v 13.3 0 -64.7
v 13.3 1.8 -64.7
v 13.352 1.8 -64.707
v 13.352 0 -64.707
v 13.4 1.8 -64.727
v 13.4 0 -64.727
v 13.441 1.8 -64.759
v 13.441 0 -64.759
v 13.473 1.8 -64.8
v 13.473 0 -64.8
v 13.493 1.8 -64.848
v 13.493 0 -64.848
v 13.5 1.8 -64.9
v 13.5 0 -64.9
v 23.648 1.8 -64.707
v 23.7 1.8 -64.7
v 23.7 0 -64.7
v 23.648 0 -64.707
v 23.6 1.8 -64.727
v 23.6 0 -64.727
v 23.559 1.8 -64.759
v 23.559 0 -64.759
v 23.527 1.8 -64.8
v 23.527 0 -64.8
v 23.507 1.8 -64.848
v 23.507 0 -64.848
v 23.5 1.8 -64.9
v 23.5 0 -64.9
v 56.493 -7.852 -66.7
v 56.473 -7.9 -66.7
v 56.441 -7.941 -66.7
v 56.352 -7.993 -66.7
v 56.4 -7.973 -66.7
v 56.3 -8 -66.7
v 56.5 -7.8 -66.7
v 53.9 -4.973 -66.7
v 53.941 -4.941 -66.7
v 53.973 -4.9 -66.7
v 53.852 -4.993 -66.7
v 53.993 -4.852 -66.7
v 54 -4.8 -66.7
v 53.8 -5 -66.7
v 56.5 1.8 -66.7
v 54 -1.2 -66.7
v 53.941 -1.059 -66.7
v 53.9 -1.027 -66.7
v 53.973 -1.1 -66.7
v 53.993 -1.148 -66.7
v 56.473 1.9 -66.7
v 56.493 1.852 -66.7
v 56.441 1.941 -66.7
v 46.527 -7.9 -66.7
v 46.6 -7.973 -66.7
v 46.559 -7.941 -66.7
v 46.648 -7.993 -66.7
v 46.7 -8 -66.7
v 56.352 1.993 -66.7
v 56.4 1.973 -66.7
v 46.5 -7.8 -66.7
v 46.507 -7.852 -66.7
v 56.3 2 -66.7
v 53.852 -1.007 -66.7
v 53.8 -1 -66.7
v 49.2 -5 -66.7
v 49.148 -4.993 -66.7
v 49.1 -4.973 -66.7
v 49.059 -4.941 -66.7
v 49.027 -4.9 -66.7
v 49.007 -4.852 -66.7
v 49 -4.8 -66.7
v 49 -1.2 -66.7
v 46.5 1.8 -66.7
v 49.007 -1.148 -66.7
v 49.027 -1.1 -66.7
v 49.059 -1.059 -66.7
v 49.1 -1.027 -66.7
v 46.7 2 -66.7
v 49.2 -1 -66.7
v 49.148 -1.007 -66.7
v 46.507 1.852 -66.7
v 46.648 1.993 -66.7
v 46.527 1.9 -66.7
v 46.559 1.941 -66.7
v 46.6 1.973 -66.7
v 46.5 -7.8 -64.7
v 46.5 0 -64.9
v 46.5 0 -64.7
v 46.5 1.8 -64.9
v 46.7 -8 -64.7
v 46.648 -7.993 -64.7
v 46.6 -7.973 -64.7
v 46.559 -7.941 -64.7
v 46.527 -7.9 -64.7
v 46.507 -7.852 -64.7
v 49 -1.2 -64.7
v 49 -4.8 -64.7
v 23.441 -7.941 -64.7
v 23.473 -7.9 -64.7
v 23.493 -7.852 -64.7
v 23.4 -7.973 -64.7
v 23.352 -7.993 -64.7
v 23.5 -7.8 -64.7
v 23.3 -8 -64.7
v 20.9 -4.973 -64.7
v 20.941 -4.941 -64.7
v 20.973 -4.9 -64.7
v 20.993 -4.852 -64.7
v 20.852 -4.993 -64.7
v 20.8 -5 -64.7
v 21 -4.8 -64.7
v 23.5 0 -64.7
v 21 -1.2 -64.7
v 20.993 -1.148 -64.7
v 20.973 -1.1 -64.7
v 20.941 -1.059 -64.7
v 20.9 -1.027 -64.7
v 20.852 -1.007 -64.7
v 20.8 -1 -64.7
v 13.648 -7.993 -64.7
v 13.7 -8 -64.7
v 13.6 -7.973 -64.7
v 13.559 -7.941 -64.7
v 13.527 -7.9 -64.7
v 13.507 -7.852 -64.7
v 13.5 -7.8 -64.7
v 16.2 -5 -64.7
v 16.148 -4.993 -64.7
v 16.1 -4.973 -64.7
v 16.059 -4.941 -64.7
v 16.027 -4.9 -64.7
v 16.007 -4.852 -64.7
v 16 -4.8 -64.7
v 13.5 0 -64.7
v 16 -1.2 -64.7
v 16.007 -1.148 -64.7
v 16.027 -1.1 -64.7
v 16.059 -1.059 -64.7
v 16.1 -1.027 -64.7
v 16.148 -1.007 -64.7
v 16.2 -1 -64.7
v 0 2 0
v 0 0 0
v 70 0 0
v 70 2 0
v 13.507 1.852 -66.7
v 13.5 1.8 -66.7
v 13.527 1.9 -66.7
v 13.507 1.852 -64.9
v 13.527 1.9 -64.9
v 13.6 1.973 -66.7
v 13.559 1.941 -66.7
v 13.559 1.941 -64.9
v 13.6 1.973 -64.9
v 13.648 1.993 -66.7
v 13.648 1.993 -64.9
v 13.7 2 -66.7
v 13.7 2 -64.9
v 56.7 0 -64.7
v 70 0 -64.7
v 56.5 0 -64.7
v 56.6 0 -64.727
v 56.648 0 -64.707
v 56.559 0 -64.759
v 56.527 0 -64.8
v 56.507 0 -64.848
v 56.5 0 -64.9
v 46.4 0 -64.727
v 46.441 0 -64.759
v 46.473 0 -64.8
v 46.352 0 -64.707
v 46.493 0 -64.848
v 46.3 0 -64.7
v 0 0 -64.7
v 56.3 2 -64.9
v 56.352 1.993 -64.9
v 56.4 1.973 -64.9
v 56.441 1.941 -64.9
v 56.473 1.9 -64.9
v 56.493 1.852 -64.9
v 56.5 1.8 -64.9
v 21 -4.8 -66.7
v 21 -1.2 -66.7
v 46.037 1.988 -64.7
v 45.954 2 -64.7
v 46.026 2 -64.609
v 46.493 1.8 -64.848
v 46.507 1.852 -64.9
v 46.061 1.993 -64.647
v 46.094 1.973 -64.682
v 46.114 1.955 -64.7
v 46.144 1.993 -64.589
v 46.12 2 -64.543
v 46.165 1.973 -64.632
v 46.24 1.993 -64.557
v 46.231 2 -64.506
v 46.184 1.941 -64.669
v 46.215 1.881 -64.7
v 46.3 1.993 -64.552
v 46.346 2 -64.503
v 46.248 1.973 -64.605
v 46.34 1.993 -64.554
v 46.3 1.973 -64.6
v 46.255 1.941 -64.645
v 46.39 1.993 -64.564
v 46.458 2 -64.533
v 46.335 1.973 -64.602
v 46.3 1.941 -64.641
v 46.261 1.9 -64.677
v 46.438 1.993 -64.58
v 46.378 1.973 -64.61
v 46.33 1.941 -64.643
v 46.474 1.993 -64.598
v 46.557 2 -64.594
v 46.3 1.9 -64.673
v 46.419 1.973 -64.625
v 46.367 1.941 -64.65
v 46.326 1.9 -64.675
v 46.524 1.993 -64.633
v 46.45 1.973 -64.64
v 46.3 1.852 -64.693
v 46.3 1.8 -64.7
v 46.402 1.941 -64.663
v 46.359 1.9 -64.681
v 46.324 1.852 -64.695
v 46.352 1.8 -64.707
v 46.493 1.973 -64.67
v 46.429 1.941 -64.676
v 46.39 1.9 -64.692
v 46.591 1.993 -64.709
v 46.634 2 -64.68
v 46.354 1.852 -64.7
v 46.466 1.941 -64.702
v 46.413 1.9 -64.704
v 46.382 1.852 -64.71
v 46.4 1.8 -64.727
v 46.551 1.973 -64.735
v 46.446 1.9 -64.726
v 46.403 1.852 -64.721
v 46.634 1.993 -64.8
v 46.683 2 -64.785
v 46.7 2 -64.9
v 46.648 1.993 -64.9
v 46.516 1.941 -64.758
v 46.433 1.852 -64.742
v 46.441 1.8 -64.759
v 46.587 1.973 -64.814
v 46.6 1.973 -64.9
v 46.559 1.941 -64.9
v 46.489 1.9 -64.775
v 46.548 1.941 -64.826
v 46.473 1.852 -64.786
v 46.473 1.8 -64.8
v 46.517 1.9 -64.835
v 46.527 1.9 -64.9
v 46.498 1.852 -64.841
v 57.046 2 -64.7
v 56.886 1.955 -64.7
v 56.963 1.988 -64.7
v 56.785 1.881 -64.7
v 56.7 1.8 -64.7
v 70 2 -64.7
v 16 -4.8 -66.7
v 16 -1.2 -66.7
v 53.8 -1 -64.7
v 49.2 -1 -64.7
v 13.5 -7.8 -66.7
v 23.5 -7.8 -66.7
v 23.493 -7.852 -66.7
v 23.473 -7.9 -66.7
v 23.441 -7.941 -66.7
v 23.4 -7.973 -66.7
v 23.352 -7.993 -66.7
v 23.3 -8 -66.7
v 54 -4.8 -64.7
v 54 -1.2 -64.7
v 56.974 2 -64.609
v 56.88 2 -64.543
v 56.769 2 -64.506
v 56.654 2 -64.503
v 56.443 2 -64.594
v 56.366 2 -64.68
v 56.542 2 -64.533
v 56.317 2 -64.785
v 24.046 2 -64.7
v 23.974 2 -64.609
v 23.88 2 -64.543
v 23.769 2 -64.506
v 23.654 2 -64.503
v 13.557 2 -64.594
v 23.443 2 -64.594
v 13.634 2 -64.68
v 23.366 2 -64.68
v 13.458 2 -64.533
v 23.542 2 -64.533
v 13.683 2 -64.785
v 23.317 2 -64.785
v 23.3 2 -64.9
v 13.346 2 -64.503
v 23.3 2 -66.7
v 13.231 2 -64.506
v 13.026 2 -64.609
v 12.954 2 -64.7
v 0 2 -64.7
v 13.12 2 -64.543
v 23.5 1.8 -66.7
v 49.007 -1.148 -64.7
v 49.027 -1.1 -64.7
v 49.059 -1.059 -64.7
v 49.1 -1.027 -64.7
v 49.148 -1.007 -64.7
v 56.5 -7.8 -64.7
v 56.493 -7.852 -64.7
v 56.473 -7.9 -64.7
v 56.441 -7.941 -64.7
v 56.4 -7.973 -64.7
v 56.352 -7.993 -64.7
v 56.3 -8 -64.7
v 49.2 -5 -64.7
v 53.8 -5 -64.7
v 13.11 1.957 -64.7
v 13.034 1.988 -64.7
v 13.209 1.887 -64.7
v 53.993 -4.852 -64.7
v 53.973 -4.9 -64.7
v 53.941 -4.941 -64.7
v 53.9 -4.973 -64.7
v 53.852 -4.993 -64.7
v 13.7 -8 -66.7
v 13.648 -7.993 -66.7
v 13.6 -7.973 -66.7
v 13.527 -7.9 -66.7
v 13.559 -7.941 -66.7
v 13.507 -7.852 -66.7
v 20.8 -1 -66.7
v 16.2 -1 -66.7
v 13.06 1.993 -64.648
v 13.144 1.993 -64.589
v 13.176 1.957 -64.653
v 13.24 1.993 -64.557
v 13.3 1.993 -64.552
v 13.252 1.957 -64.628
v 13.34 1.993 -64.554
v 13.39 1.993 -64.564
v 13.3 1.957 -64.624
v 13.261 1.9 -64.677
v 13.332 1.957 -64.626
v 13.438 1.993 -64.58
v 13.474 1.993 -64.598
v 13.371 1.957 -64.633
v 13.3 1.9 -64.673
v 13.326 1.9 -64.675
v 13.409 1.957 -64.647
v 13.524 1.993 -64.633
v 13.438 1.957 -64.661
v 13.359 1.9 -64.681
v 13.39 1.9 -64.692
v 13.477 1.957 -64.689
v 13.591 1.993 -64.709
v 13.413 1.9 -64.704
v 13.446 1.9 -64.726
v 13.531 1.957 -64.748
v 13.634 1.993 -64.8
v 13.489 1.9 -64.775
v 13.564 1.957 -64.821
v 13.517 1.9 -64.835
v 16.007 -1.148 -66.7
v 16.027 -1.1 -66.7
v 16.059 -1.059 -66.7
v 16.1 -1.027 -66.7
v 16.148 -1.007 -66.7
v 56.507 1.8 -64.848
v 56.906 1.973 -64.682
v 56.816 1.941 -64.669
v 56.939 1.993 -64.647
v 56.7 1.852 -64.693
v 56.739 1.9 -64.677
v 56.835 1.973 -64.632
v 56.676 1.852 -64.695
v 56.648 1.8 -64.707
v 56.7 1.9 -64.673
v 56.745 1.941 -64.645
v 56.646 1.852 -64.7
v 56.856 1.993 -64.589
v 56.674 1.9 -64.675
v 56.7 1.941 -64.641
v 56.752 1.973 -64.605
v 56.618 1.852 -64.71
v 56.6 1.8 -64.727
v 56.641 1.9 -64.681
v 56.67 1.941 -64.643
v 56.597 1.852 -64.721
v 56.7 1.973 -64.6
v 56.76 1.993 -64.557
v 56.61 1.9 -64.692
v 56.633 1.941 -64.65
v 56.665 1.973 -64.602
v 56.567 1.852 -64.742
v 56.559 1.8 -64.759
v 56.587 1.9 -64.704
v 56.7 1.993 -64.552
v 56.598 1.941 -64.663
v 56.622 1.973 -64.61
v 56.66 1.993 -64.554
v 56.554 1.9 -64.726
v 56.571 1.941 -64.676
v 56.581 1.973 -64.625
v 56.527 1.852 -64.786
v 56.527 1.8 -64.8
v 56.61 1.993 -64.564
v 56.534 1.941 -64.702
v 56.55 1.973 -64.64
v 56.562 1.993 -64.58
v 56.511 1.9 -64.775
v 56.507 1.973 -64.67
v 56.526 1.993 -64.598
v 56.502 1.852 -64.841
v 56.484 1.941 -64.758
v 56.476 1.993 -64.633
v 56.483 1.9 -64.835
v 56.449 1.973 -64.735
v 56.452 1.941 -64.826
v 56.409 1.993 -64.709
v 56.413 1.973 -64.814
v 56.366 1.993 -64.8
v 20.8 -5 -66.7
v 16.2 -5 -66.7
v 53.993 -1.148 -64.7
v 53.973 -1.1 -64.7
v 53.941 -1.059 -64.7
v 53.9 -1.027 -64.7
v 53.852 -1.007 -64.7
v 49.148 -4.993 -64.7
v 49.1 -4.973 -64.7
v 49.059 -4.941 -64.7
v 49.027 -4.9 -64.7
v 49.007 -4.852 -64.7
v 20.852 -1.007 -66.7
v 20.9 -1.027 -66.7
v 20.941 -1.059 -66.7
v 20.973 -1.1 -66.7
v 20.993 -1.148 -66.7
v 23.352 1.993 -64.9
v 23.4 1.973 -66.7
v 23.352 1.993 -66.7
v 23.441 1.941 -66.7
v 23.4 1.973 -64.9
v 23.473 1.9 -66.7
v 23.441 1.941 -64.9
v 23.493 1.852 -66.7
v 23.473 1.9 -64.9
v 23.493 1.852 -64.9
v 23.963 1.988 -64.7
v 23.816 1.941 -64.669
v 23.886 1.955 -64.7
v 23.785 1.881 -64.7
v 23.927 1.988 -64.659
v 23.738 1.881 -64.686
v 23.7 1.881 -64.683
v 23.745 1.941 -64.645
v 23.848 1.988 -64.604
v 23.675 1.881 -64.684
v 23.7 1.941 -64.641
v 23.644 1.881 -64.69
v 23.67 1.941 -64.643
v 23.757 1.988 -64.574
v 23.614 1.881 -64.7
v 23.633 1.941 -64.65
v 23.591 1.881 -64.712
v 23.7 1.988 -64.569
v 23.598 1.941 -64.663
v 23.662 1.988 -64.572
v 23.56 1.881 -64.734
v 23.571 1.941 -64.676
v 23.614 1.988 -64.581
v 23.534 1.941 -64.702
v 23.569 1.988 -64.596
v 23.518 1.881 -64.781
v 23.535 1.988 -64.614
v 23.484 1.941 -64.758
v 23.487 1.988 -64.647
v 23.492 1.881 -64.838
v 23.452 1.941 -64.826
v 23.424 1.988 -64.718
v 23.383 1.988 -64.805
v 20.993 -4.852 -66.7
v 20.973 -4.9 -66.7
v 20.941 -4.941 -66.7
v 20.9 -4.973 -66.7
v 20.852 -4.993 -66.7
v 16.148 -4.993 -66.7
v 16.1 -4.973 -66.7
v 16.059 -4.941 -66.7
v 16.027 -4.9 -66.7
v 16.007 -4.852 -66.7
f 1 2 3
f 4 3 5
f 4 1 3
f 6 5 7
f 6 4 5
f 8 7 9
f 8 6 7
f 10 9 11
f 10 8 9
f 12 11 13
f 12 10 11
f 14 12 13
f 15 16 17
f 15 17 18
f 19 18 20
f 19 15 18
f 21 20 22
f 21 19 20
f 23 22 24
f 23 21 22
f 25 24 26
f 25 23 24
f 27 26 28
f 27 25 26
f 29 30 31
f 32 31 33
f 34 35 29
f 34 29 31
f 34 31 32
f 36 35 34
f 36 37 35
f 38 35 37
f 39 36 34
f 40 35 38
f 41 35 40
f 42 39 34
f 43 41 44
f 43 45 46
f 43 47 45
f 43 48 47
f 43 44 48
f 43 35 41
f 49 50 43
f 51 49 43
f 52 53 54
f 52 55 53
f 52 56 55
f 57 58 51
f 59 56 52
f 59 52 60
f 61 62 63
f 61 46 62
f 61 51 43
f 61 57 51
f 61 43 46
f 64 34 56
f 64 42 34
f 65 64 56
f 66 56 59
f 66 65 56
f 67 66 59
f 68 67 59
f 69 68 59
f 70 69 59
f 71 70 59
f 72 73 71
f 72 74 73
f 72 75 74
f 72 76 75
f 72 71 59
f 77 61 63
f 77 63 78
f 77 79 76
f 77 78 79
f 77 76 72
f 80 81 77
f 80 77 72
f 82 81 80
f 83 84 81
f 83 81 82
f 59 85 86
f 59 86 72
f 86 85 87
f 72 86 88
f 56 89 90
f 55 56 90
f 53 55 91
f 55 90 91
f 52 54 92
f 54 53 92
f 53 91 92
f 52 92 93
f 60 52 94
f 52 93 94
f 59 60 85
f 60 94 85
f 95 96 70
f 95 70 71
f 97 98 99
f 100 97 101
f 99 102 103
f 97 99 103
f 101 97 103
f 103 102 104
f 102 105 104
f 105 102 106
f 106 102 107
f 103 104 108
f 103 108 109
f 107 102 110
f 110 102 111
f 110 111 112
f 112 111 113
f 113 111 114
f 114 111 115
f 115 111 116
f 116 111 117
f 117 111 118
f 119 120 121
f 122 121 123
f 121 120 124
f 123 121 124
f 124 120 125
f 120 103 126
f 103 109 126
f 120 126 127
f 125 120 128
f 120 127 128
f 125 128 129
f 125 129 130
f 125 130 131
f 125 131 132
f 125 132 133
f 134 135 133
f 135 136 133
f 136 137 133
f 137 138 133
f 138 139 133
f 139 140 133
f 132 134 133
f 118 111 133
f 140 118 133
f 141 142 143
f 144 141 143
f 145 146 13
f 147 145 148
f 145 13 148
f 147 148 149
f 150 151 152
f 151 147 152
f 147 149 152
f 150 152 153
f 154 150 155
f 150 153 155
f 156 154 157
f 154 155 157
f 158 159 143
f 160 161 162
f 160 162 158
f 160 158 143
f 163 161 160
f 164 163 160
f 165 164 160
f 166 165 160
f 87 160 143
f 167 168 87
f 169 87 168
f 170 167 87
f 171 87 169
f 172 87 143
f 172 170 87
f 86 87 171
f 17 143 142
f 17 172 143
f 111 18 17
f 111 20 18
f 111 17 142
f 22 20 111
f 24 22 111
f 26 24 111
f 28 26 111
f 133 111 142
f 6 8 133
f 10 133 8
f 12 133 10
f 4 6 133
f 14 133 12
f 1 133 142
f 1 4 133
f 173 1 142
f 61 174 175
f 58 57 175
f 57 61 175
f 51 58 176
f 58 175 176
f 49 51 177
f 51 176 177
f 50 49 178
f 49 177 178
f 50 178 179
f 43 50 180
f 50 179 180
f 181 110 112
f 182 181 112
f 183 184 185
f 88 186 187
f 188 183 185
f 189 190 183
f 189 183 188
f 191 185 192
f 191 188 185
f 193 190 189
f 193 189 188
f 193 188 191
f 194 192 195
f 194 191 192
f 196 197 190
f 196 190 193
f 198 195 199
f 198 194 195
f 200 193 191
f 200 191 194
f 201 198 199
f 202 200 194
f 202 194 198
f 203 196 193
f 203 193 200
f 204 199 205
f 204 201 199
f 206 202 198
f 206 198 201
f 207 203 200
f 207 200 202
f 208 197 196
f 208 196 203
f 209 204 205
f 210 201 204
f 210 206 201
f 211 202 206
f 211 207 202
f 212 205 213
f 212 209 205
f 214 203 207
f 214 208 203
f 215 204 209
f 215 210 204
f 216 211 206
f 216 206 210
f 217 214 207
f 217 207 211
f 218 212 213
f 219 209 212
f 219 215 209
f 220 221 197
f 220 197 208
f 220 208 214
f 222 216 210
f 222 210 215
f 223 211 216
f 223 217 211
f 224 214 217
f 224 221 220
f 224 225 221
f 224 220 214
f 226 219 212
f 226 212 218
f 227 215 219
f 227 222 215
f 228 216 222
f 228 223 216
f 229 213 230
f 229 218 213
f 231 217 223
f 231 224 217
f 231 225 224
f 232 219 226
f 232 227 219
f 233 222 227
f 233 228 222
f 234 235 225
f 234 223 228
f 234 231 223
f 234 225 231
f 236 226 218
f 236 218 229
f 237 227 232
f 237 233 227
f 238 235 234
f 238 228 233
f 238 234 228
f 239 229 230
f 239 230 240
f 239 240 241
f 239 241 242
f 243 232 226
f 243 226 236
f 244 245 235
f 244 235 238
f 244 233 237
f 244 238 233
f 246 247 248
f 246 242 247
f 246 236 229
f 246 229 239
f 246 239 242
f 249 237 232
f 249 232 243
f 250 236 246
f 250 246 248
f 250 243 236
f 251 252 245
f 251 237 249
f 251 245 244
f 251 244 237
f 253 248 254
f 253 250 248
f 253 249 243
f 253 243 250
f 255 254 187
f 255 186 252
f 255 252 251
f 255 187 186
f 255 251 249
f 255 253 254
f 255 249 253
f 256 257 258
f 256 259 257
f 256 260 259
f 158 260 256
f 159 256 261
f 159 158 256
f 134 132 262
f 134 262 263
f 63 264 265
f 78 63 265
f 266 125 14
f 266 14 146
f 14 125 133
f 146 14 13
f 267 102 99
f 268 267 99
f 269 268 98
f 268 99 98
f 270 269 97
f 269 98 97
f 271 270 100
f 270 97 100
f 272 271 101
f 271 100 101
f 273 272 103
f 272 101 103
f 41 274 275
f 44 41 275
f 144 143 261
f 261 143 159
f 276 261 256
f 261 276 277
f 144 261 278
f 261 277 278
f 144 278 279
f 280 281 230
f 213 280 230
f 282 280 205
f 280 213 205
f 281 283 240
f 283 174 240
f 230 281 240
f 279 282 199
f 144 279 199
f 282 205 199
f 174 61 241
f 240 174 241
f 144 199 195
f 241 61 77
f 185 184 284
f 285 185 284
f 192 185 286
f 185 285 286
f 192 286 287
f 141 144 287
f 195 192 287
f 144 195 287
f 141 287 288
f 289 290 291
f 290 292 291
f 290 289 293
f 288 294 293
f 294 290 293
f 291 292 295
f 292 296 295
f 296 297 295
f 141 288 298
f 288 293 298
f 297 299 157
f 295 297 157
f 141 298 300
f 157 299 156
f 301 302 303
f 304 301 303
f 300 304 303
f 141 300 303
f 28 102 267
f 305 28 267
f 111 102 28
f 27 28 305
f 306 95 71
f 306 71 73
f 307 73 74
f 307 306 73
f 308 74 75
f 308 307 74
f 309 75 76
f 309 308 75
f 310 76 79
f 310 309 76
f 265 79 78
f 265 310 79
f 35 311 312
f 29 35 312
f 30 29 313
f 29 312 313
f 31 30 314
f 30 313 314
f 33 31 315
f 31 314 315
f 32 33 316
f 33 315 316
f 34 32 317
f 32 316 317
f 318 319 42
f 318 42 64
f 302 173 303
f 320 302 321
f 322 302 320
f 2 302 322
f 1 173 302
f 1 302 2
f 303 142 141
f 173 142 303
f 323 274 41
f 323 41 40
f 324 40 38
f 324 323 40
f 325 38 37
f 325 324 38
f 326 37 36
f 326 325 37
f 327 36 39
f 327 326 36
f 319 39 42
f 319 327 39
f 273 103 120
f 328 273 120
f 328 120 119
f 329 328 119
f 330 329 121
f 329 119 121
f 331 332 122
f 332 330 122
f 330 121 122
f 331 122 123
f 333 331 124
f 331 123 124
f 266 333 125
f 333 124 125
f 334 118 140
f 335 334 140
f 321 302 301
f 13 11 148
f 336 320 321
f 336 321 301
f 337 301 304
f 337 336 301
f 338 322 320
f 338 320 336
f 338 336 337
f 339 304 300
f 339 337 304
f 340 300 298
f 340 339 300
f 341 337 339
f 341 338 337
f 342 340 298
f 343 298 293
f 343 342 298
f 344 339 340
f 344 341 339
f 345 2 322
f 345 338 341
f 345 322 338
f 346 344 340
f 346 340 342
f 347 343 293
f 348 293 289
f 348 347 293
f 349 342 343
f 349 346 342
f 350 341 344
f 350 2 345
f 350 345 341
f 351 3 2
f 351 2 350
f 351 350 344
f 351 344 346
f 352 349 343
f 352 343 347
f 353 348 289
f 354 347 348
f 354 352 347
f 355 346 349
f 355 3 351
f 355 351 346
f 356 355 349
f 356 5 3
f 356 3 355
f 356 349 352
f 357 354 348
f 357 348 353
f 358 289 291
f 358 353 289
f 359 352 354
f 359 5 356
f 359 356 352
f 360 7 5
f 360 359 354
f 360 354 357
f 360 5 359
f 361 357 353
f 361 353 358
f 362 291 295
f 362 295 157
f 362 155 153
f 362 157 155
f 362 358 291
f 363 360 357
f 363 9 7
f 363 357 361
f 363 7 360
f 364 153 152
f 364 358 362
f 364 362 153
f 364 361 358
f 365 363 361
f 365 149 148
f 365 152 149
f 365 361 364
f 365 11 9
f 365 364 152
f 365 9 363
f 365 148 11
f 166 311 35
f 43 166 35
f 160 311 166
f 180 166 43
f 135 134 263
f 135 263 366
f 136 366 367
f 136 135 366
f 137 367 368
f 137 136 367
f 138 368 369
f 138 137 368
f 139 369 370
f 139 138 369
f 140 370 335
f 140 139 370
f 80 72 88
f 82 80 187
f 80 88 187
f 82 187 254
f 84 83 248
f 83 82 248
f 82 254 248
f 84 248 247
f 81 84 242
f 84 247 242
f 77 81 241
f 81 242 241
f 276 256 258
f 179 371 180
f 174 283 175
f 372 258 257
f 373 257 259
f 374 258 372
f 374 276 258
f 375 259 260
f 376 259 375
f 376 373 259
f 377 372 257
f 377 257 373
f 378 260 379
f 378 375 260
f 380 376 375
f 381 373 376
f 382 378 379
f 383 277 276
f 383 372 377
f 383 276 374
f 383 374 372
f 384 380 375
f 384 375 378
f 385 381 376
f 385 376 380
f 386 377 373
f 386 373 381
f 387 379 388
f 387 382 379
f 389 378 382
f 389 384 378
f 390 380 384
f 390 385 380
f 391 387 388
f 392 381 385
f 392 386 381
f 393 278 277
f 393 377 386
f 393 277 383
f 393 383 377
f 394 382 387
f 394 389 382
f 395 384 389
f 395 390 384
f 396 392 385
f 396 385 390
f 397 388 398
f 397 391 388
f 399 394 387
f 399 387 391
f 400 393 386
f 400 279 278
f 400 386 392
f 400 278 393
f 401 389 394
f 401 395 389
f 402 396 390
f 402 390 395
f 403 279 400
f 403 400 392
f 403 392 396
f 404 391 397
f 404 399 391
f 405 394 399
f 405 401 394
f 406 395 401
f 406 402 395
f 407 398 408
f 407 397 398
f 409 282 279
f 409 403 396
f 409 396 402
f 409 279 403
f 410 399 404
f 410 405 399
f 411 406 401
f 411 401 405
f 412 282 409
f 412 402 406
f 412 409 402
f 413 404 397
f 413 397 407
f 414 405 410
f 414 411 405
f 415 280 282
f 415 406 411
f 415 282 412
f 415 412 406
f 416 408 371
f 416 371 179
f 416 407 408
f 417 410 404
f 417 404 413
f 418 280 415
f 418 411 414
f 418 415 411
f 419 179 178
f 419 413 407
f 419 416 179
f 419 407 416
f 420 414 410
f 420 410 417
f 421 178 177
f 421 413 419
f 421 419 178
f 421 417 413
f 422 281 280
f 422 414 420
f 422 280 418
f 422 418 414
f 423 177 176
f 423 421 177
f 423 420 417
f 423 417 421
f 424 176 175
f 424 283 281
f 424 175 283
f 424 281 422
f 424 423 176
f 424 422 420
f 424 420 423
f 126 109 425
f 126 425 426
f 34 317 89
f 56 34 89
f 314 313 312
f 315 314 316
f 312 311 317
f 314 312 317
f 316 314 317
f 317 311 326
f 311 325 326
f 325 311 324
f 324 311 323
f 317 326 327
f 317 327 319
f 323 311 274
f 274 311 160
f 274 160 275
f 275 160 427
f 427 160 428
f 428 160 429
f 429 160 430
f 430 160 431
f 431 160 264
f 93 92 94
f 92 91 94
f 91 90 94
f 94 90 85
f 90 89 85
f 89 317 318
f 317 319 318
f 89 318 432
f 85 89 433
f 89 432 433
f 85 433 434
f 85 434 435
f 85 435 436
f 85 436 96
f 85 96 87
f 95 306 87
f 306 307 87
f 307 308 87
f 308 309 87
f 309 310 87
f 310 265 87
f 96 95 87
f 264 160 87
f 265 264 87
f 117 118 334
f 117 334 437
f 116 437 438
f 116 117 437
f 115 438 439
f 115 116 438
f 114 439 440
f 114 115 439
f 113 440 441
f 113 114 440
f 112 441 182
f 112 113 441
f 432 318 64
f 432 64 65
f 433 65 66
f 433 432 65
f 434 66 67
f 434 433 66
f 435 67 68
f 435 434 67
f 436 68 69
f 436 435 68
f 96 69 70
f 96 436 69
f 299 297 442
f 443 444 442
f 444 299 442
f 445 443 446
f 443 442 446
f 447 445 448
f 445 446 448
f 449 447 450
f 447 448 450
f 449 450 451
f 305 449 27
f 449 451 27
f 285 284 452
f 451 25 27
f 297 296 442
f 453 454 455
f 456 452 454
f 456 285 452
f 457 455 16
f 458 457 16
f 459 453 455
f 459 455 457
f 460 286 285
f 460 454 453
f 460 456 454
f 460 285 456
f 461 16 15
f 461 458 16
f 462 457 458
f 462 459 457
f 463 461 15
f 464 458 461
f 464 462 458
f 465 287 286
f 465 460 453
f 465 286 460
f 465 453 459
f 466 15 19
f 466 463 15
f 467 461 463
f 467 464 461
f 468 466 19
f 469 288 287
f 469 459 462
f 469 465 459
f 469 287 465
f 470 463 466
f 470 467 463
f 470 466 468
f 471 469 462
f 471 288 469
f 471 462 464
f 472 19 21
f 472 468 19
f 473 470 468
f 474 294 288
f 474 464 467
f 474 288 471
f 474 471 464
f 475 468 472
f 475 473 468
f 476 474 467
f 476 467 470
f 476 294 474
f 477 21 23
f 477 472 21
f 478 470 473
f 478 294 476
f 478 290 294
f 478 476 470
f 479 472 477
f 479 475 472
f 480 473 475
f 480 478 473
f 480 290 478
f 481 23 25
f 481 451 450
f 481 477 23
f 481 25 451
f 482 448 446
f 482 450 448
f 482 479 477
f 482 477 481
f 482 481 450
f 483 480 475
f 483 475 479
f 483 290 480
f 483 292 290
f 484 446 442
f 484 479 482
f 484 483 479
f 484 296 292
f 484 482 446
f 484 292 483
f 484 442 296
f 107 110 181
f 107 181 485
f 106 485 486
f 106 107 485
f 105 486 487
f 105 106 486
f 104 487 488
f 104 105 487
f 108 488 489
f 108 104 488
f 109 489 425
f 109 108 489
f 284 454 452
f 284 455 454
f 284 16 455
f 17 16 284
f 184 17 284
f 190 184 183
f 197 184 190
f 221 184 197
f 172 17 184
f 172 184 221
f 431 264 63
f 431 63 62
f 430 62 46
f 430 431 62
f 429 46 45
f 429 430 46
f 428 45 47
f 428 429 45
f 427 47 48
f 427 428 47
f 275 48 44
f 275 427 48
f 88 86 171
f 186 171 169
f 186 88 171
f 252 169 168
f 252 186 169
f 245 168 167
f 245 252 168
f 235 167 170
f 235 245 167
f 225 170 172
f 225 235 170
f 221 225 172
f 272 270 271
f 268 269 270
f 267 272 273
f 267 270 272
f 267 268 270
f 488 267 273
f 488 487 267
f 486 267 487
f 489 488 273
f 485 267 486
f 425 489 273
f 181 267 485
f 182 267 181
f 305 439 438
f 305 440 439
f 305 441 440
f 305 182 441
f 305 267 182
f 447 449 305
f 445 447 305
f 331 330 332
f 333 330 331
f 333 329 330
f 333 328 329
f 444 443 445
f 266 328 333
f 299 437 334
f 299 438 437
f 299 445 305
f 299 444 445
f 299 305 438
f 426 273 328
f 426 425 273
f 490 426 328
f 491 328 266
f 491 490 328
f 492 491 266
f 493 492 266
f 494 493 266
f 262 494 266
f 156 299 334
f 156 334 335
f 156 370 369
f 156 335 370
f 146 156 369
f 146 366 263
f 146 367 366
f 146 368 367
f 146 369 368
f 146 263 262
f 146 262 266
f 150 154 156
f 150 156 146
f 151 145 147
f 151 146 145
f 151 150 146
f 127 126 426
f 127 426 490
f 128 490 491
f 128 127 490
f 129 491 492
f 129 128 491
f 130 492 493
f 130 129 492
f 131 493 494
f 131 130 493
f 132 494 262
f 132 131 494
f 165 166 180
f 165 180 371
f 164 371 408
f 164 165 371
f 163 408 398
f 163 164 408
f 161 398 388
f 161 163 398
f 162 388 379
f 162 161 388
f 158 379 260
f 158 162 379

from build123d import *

# Parameters (mm, degrees)
SKETCH1_W           = 70
SKETCH1_H           = 64.7
BOSS_EXTRUDE1_DEPTH = 2
SKETCH2_W           = 10
SKETCH2_H           = 10
SKETCH2_W_2         = 5
SKETCH2_H_2         = 4
BOSS_EXTRUDE2_DEPTH = 2
FILLET2_R           = 0.2


with BuildPart() as part:
    # Sketch1 → Boss-Extrude1 (new body)
    with BuildSketch(Plane(origin=(0, 0, 0), x_dir=(1, 0, 0), z_dir=(0, 1, 0))):
        with Locations((35, 32.35)):
            Rectangle(SKETCH1_W, SKETCH1_H)
    extrude(amount=BOSS_EXTRUDE1_DEPTH)

    # Sketch2 → Boss-Extrude2 (add)
    # profile 1 of 2: a face of its own
    with BuildSketch(Plane(origin=(0, 0, -64.7), x_dir=(-1, 0, 0), z_dir=(0, 0, -1))):
        with Locations((-51.5, -3)):
            Rectangle(SKETCH2_W, SKETCH2_H)
        with Locations((-51.5, -3)):
            Rectangle(SKETCH2_W_2, SKETCH2_H_2, mode=Mode.SUBTRACT)
    # profile 2 of 2: a face of its own
    with BuildSketch(Plane(origin=(0, 0, -64.7), x_dir=(-1, 0, 0), z_dir=(0, 0, -1))):
        with Locations((-18.5, -3)):
            Rectangle(SKETCH2_W, SKETCH2_H)
        with Locations((-18.5, -3)):
            Rectangle(SKETCH2_W_2, SKETCH2_H_2, mode=Mode.SUBTRACT)
    extrude(amount=BOSS_EXTRUDE2_DEPTH)

    # Fillet2
    # the kernel refuses this fillet: 0.2 mm, written as the material it adds along each edge
    with BuildSketch(Plane(origin=(13.5, 0, -64.7), x_dir=(-1, 0, 0), z_dir=(0, 1, 0)), Plane(origin=(23.5, 2, -64.7), x_dir=(1, 0, 0), z_dir=(0, -1, 0)), Plane(origin=(21, -5, -64.7), x_dir=(0, 1, 0), z_dir=(0, 0, -1)), Plane(origin=(16, -5, -64.7), x_dir=(1, 0, 0), z_dir=(0, 0, -1)), Plane(origin=(49, -5, -64.7), x_dir=(1, 0, 0), z_dir=(0, 0, -1)), Plane(origin=(49, -1, -64.7), x_dir=(0, -1, 0), z_dir=(0, 0, -1))) as fillet2_piece_1:
        with BuildLine():
            CenterArc((FILLET2_R, -FILLET2_R), FILLET2_R, 90, 90)
            Line((0, -FILLET2_R), (0, 0))
            Line((0, 0), (FILLET2_R, 0))
        make_face()
    extrude(amount=2)
    with BuildSketch(Plane(origin=(56.5, 0, -64.7), x_dir=(1, 0, 0), z_dir=(0, 1, 0)), Plane(origin=(46.5, 2, -64.7), x_dir=(-1, 0, 0), z_dir=(0, -1, 0)), Plane(origin=(21, -1, -64.7), x_dir=(0, -1, 0), z_dir=(0, 0, -1)), Plane(origin=(16, -1, -64.7), x_dir=(1, 0, 0), z_dir=(0, 0, -1)), Plane(origin=(54, -1, -64.7), x_dir=(0, -1, 0), z_dir=(0, 0, -1)), Plane(origin=(54, -5, -64.7), x_dir=(-1, 0, 0), z_dir=(0, 0, -1))) as fillet2_piece_2:
        with BuildLine():
            CenterArc((FILLET2_R, FILLET2_R), FILLET2_R, 180, 90)
            Line((0, FILLET2_R), (0, 0))
            Line((0, 0), (FILLET2_R, 0))
        make_face()
    extrude(amount=2)
    # the kernel refuses this fillet: 0.2 mm, written as the material it takes off along each edge
    with BuildSketch(Plane(origin=(13.5, 2, -64.9), x_dir=(1, 0, 0), z_dir=(0, 0, -1)), Plane(origin=(46.5, 2, -64.9), x_dir=(1, 0, 0), z_dir=(0, 0, -1))) as fillet2_2_piece_1:
        with BuildLine():
            CenterArc((FILLET2_R, FILLET2_R), FILLET2_R, 180, 90)
            Line((0, FILLET2_R), (0, 0))
            Line((0, 0), (FILLET2_R, 0))
        make_face()
    extrude(amount=2.3, mode=Mode.SUBTRACT)
    with BuildSketch(Plane(origin=(13.5, -8, -64.2), x_dir=(0, 1, 0), z_dir=(0, 0, -1)), Plane(origin=(46.5, -8, -64.2), x_dir=(0, 1, 0), z_dir=(0, 0, -1))) as fillet2_2_piece_2:
        with BuildLine():
            CenterArc((FILLET2_R, FILLET2_R), FILLET2_R, 180, 90)
            Line((0, FILLET2_R), (0, 0))
            Line((0, 0), (FILLET2_R, 0))
        make_face()
    extrude(amount=3, mode=Mode.SUBTRACT)
    with BuildSketch(Plane(origin=(23.5, -8, -64.2), x_dir=(0, 1, 0), z_dir=(0, 0, -1)), Plane(origin=(56.5, -8, -64.2), x_dir=(0, 1, 0), z_dir=(0, 0, -1))) as fillet2_2_piece_3:
        with BuildLine():
            CenterArc((FILLET2_R, -FILLET2_R), FILLET2_R, 90, 90)
            Line((0, -FILLET2_R), (0, 0))
            Line((0, 0), (FILLET2_R, 0))
        make_face()
    extrude(amount=3, mode=Mode.SUBTRACT)
    with BuildSketch(Plane(origin=(23.5, 2, -64.9), x_dir=(-1, 0, 0), z_dir=(0, 0, -1)), Plane(origin=(56.5, 2, -64.9), x_dir=(-1, 0, 0), z_dir=(0, 0, -1))) as fillet2_2_piece_4:
        with BuildLine():
            CenterArc((FILLET2_R, -FILLET2_R), FILLET2_R, 90, 90)
            Line((0, -FILLET2_R), (0, 0))
            Line((0, 0), (FILLET2_R, 0))
        make_face()
    extrude(amount=2.3, mode=Mode.SUBTRACT)
    with BuildSketch(Plane(origin=(46.3, 2, -64.9), x_dir=(-0.5976672776327815, 0, -0.8017442392976825), z_dir=(0.8017442392976825, 0, -0.5976672776327815))) as fillet2_2_piece_5:
        with BuildLine():
            CenterArc((0.2 + FILLET2_R, -FILLET2_R), FILLET2_R, 90, 90)
            Line((0.2, -FILLET2_R), (0.2, 0))
            Line((0.2, 0), (0.2 + FILLET2_R, 0))
        make_face()
    revolve(axis=Axis((46.3, 2, -64.9), (0, 1, 0)), revolution_arc=233.296989237, mode=Mode.SUBTRACT)
    with BuildSketch(Plane(origin=(56.7, 2, -64.9), x_dir=(0.5976672776327815, 0, -0.8017442392976825), z_dir=(-0.8017442392976825, 0, -0.5976672776327815))) as fillet2_2_piece_6:
        with BuildLine():
            CenterArc((0.2 + FILLET2_R, FILLET2_R), FILLET2_R, 180, 90)
            Line((0.2, FILLET2_R), (0.2, 0))
            Line((0.2, 0), (0.2 + FILLET2_R, 0))
        make_face()
    revolve(axis=Axis((56.7, 2, -64.9), (0, -1, 0)), revolution_arc=233.296989237, mode=Mode.SUBTRACT)
    with BuildSketch(Plane(origin=(23.7, 2, -64.9), x_dir=(0.5976672776328044, 0, -0.8017442392976655), z_dir=(-0.8017442392976655, 0, -0.5976672776328044))) as fillet2_2_piece_7:
        with BuildLine():
            CenterArc((0.2 + FILLET2_R, FILLET2_R), FILLET2_R, 180, 90)
            Line((0.2, FILLET2_R), (0.2, 0))
            Line((0.2, 0), (0.2 + FILLET2_R, 0))
        make_face()
    revolve(axis=Axis((23.7, 2, -64.9), (0, -1, 0)), revolution_arc=233.296989237, mode=Mode.SUBTRACT)
    with BuildSketch(Plane(origin=(13.3, 2, -64.9), x_dir=(-0.5976672776327986, 0, -0.8017442392976697), z_dir=(0.8017442392976697, 0, -0.5976672776327986))) as fillet2_2_piece_8:
        with BuildLine():
            CenterArc((0.2 + FILLET2_R, -FILLET2_R), FILLET2_R, 90, 90)
            Line((0.2, -FILLET2_R), (0.2, 0))
            Line((0.2, 0), (0.2 + FILLET2_R, 0))
        make_face()
    revolve(axis=Axis((13.3, 2, -64.9), (0, 1, 0)), revolution_arc=233.296989237, mode=Mode.SUBTRACT)


solid = part.part
